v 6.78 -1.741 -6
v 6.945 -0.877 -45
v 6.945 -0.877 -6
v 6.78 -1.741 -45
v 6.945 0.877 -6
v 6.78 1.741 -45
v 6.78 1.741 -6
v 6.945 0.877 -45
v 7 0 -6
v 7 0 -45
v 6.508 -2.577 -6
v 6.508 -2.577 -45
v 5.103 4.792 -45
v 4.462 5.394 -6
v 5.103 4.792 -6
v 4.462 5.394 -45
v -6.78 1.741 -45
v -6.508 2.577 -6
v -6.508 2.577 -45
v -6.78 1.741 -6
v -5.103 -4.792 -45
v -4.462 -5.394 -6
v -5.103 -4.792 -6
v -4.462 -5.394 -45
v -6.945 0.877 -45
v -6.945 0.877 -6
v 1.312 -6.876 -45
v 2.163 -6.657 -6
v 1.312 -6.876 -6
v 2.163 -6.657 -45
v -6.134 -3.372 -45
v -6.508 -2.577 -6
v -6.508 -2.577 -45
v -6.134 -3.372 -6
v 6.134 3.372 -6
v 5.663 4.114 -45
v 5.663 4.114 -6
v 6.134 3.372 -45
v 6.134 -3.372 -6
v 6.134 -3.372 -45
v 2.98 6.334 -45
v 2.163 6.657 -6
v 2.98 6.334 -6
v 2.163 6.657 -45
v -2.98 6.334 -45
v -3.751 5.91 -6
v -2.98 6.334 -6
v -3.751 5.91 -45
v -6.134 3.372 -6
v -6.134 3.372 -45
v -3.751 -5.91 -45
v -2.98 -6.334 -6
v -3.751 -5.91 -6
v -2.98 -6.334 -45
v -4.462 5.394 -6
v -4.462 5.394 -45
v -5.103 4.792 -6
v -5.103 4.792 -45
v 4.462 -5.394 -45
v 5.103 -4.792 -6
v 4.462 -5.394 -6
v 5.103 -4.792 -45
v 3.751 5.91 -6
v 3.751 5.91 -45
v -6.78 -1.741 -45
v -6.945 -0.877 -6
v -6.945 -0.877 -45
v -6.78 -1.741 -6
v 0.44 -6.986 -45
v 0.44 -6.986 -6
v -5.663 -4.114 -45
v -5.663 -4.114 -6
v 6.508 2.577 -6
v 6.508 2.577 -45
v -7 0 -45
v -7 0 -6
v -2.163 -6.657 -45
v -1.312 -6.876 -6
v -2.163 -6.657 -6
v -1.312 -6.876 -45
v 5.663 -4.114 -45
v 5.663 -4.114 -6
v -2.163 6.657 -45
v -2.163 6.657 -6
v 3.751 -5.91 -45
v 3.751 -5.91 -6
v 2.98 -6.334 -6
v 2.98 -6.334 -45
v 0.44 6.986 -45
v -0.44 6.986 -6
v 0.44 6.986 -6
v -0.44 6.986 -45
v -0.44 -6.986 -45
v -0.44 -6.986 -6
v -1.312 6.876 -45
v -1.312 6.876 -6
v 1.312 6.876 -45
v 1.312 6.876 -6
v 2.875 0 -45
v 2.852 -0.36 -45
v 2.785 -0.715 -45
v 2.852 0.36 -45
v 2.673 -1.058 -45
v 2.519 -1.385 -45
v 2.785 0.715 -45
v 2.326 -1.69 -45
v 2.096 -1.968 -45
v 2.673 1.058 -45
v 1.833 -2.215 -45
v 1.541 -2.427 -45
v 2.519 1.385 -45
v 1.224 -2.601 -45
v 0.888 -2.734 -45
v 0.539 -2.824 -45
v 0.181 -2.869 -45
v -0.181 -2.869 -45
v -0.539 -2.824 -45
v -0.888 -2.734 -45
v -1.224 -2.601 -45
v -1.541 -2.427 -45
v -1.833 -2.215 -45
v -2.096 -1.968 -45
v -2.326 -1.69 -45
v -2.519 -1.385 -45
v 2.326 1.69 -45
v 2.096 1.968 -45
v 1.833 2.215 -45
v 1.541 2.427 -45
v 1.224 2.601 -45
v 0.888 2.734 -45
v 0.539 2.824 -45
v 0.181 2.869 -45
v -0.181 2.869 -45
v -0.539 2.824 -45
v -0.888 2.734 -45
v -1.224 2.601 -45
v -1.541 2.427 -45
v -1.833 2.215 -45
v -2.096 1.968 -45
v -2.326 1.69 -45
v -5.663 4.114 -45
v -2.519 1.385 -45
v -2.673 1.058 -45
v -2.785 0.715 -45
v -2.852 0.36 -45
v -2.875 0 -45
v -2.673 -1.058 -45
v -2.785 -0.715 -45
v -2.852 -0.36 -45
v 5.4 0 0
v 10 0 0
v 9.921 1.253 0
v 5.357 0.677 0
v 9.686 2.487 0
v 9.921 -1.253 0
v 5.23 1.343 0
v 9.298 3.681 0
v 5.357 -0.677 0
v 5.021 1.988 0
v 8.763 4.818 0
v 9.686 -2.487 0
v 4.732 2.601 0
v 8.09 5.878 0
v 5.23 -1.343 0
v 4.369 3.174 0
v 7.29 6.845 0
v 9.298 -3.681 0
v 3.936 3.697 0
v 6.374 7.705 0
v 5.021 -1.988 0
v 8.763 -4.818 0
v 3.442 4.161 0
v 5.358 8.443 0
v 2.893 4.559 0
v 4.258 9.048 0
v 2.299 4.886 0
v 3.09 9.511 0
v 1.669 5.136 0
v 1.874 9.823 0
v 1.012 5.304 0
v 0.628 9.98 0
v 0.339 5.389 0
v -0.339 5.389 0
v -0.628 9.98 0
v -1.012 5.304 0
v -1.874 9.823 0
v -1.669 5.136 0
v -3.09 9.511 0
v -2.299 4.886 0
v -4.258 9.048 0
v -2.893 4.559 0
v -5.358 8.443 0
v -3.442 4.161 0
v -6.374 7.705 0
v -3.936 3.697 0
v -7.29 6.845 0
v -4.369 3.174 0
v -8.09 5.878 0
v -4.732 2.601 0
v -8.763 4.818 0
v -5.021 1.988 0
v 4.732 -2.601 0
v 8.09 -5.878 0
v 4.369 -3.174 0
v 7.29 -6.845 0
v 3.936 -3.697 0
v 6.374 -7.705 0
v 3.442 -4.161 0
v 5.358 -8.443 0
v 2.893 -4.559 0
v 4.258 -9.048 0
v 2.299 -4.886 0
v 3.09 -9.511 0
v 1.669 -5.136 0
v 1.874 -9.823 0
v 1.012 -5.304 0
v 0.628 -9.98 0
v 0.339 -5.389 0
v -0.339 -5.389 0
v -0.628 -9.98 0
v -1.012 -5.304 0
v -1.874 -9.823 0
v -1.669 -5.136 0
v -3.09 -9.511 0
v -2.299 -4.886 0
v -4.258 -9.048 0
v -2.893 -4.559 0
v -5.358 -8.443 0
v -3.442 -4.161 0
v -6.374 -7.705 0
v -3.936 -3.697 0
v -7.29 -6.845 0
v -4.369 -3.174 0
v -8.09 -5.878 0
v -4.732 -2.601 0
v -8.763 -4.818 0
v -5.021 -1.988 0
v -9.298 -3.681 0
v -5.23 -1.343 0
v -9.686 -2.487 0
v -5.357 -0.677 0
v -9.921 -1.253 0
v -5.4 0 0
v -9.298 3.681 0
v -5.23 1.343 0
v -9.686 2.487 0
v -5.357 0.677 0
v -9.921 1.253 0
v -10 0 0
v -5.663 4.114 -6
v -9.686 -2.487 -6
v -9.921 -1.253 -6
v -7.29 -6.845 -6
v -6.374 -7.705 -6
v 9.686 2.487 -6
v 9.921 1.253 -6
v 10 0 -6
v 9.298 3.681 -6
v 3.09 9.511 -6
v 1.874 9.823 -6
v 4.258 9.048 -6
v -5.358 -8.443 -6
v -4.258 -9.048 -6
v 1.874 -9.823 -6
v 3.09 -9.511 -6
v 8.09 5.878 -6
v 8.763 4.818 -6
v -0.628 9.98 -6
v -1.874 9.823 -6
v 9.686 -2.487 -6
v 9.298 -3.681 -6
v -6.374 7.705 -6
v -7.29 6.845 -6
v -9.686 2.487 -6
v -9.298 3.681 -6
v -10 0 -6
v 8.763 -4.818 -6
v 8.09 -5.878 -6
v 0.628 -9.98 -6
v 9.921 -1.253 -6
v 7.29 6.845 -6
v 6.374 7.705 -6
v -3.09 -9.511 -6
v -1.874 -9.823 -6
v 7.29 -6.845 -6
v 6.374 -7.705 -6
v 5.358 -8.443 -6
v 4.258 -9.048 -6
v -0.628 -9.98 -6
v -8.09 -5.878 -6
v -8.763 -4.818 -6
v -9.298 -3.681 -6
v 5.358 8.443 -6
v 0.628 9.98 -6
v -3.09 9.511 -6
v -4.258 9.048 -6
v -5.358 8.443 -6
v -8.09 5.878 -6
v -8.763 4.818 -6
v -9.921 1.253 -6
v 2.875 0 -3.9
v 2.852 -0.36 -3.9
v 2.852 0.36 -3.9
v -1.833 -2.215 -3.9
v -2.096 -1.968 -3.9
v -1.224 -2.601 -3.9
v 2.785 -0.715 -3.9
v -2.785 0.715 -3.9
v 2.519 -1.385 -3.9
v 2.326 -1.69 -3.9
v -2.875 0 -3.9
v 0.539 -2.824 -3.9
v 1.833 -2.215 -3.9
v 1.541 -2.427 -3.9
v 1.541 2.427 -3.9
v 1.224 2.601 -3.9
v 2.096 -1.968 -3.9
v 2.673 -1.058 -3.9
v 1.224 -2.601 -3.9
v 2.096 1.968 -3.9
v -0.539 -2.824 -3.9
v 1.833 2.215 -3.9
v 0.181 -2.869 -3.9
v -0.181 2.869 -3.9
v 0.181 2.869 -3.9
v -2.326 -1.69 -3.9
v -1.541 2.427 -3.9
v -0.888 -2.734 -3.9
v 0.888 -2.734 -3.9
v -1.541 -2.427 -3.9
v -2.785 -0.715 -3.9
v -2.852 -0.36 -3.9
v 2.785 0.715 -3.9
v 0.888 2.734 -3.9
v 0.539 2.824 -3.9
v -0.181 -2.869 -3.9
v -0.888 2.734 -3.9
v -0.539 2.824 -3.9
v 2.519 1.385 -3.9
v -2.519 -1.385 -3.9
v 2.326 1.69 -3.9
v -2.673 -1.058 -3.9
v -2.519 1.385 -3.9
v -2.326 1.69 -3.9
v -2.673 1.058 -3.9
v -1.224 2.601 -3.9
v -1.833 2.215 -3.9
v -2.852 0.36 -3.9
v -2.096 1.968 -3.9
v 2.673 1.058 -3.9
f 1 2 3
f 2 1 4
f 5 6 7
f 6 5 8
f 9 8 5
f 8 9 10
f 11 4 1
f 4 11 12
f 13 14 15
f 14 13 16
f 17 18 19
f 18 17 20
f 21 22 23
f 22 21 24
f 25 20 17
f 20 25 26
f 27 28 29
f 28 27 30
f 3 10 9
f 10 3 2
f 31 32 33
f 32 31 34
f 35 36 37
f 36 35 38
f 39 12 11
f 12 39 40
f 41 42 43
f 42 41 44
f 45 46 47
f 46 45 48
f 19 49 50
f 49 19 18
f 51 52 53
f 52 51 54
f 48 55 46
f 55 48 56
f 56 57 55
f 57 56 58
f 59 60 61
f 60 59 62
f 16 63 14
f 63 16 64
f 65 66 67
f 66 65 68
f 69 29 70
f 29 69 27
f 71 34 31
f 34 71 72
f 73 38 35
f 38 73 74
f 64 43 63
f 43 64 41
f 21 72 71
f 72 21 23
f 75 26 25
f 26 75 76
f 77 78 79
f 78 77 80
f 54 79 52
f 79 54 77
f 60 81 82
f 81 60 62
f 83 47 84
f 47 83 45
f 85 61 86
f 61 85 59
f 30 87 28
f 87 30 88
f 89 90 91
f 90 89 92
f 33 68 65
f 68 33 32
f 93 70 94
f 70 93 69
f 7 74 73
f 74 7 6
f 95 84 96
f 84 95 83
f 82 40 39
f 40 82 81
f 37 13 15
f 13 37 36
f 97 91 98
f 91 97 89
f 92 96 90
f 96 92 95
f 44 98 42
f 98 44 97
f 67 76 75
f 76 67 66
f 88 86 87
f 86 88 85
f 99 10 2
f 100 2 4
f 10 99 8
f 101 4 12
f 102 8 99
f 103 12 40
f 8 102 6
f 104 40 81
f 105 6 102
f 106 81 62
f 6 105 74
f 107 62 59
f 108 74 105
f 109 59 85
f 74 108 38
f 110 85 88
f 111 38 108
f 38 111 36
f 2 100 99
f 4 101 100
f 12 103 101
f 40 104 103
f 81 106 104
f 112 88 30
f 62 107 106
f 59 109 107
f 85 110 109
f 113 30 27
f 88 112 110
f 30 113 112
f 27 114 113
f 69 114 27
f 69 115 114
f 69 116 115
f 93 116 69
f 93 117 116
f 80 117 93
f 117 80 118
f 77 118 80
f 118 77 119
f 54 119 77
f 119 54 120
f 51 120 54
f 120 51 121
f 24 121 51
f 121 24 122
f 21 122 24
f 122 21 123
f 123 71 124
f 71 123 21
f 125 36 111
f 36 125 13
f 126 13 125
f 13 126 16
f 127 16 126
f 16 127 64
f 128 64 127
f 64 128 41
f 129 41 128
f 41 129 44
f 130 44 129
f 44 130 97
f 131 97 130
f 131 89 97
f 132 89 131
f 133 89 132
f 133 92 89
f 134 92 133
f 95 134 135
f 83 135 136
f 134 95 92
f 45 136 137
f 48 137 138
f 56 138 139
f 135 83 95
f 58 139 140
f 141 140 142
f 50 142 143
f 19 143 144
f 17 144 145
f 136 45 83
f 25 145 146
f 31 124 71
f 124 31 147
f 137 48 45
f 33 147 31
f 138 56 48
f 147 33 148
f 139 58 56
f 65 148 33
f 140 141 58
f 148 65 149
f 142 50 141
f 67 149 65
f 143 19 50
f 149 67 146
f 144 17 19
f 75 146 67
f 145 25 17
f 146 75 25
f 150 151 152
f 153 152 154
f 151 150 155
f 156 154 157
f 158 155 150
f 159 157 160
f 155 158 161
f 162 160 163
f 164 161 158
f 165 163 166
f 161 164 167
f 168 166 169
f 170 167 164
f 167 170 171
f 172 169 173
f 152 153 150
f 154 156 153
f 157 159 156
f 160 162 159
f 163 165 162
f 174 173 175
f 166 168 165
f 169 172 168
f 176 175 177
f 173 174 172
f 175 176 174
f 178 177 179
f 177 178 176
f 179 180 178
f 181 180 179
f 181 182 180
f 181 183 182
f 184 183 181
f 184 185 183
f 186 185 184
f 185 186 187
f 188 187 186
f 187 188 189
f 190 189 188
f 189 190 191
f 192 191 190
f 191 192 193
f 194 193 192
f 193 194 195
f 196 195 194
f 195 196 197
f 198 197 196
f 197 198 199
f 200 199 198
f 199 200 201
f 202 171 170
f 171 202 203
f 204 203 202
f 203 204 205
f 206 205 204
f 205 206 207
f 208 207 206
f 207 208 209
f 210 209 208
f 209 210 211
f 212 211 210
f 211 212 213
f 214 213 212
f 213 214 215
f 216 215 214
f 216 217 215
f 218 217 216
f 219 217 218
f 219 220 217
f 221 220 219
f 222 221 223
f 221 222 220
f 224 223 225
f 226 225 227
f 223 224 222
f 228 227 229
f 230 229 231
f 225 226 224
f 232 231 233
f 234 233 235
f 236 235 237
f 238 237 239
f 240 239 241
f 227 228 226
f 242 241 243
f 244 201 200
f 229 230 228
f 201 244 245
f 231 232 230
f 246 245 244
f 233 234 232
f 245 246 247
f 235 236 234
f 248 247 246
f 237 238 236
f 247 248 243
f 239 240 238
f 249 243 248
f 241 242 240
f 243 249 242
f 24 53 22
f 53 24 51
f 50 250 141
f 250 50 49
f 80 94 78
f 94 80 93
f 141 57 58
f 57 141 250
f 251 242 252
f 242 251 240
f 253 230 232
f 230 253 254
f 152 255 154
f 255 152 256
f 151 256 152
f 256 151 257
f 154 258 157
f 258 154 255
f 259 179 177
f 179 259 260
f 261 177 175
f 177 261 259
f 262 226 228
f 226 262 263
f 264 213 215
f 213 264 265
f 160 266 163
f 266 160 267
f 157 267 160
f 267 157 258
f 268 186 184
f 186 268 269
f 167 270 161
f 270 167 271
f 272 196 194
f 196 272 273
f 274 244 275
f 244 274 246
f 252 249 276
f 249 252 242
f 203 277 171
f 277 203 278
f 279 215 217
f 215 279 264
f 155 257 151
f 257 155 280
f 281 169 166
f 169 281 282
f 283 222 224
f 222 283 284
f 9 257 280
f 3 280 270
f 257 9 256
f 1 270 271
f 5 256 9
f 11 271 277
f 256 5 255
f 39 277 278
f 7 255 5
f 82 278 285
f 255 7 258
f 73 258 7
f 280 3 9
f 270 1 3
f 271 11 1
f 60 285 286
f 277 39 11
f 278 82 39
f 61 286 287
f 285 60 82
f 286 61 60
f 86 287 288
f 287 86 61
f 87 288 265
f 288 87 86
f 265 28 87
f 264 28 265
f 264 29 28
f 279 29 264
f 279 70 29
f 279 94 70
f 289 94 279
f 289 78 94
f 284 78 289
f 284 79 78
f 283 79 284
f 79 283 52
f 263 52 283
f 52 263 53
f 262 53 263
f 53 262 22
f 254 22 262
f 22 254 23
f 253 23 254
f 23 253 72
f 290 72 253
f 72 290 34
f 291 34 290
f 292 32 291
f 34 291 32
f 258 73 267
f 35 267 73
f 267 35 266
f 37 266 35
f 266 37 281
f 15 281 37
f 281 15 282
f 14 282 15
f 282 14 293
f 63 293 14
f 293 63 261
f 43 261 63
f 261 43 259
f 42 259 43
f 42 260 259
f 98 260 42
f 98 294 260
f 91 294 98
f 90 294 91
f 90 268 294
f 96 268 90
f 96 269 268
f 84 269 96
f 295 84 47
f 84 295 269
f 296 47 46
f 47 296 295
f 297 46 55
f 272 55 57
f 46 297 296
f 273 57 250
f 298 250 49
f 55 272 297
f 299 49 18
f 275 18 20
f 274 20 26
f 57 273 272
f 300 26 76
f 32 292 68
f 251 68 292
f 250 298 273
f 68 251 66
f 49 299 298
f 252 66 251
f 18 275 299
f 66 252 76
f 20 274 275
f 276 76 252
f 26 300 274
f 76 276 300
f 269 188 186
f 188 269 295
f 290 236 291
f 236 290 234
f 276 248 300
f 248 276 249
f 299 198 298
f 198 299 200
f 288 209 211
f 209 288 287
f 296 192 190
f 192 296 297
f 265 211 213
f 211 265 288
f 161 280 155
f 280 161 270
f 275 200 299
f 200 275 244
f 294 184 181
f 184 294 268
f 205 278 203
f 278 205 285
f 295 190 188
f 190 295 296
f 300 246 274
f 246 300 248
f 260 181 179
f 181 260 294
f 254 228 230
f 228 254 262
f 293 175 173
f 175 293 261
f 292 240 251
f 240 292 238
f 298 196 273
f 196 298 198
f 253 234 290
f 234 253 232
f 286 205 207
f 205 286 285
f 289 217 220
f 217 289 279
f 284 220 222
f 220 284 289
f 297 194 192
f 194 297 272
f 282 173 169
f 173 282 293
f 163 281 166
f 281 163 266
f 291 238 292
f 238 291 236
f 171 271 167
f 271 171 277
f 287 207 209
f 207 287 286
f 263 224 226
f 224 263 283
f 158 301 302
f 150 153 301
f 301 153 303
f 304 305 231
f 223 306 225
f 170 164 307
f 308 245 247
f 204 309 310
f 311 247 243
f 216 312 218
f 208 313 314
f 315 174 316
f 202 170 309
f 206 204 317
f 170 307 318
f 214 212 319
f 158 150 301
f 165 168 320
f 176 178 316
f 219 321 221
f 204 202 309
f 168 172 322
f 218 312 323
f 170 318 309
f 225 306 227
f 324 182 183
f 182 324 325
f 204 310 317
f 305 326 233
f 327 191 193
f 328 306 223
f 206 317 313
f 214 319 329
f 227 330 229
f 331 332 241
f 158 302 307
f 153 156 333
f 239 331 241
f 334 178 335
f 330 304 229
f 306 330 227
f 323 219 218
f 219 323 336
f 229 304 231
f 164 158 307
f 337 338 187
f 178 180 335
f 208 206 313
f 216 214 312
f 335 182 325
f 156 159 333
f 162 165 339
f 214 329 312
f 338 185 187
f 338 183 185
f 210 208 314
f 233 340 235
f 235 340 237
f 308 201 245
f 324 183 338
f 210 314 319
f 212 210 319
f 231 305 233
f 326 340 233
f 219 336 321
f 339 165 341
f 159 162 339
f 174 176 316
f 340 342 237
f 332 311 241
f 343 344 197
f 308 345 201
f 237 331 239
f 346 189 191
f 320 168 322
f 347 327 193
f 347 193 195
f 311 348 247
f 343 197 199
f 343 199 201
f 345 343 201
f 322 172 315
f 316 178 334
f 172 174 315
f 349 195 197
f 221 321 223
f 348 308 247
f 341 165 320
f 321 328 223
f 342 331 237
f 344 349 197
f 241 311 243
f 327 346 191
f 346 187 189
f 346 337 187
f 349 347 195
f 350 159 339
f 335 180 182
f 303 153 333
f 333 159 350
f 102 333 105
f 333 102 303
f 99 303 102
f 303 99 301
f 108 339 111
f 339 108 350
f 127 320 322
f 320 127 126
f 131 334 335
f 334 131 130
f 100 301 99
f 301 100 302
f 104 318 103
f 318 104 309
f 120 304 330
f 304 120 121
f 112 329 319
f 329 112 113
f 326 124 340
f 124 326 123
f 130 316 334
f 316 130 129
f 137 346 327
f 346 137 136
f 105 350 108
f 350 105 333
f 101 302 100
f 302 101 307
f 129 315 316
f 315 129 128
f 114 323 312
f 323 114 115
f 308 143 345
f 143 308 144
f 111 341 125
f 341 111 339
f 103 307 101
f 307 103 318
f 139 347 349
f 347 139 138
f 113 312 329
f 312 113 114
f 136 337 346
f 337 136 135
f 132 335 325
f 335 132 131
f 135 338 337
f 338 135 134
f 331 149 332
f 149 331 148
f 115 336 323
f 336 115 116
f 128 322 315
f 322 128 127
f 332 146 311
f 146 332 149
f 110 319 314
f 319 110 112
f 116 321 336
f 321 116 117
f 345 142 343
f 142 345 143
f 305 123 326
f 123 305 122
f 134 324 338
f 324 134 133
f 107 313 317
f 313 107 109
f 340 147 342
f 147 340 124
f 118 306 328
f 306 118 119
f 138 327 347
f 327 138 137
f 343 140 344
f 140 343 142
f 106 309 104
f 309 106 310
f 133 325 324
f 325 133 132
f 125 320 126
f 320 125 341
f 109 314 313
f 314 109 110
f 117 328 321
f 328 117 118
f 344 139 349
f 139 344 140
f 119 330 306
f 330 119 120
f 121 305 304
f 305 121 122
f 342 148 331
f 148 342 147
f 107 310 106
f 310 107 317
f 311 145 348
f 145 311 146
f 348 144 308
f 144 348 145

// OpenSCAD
$fn = 50;


difference() {
	union() {
		translate(v = [0, 0, -45.0000000000]) {
			cylinder(h = 45, r = 7.0000000000);
		}
		translate(v = [0, 0, -6.0000000000]) {
			cylinder(h = 6, r = 10.0000000000);
		}
	}
	union() {
		translate(v = [0, 0, 0]) {
			rotate(a = [0, 0, 0]) {
				difference() {
					union() {
						#translate(v = [0, 0, -45.0000000000]) {
							cylinder(h = 45, r = 2.6000000000);
						}
						#translate(v = [0, 0, -3.9000000000]) {
							cylinder(h = 3.9000000000, r = 7.0000000000, r1 = 2.8750000000, r2 = 5.4000000000);
						}
						#translate(v = [0, 0, -45.0000000000]) {
							cylinder(h = 45, r = 2.8750000000);
						}
						#translate(v = [0, 0, -45.0000000000]) {
							cylinder(h = 45, r = 2.6000000000);
						}
					}
					union();
				}
			}
		}
	}
}
